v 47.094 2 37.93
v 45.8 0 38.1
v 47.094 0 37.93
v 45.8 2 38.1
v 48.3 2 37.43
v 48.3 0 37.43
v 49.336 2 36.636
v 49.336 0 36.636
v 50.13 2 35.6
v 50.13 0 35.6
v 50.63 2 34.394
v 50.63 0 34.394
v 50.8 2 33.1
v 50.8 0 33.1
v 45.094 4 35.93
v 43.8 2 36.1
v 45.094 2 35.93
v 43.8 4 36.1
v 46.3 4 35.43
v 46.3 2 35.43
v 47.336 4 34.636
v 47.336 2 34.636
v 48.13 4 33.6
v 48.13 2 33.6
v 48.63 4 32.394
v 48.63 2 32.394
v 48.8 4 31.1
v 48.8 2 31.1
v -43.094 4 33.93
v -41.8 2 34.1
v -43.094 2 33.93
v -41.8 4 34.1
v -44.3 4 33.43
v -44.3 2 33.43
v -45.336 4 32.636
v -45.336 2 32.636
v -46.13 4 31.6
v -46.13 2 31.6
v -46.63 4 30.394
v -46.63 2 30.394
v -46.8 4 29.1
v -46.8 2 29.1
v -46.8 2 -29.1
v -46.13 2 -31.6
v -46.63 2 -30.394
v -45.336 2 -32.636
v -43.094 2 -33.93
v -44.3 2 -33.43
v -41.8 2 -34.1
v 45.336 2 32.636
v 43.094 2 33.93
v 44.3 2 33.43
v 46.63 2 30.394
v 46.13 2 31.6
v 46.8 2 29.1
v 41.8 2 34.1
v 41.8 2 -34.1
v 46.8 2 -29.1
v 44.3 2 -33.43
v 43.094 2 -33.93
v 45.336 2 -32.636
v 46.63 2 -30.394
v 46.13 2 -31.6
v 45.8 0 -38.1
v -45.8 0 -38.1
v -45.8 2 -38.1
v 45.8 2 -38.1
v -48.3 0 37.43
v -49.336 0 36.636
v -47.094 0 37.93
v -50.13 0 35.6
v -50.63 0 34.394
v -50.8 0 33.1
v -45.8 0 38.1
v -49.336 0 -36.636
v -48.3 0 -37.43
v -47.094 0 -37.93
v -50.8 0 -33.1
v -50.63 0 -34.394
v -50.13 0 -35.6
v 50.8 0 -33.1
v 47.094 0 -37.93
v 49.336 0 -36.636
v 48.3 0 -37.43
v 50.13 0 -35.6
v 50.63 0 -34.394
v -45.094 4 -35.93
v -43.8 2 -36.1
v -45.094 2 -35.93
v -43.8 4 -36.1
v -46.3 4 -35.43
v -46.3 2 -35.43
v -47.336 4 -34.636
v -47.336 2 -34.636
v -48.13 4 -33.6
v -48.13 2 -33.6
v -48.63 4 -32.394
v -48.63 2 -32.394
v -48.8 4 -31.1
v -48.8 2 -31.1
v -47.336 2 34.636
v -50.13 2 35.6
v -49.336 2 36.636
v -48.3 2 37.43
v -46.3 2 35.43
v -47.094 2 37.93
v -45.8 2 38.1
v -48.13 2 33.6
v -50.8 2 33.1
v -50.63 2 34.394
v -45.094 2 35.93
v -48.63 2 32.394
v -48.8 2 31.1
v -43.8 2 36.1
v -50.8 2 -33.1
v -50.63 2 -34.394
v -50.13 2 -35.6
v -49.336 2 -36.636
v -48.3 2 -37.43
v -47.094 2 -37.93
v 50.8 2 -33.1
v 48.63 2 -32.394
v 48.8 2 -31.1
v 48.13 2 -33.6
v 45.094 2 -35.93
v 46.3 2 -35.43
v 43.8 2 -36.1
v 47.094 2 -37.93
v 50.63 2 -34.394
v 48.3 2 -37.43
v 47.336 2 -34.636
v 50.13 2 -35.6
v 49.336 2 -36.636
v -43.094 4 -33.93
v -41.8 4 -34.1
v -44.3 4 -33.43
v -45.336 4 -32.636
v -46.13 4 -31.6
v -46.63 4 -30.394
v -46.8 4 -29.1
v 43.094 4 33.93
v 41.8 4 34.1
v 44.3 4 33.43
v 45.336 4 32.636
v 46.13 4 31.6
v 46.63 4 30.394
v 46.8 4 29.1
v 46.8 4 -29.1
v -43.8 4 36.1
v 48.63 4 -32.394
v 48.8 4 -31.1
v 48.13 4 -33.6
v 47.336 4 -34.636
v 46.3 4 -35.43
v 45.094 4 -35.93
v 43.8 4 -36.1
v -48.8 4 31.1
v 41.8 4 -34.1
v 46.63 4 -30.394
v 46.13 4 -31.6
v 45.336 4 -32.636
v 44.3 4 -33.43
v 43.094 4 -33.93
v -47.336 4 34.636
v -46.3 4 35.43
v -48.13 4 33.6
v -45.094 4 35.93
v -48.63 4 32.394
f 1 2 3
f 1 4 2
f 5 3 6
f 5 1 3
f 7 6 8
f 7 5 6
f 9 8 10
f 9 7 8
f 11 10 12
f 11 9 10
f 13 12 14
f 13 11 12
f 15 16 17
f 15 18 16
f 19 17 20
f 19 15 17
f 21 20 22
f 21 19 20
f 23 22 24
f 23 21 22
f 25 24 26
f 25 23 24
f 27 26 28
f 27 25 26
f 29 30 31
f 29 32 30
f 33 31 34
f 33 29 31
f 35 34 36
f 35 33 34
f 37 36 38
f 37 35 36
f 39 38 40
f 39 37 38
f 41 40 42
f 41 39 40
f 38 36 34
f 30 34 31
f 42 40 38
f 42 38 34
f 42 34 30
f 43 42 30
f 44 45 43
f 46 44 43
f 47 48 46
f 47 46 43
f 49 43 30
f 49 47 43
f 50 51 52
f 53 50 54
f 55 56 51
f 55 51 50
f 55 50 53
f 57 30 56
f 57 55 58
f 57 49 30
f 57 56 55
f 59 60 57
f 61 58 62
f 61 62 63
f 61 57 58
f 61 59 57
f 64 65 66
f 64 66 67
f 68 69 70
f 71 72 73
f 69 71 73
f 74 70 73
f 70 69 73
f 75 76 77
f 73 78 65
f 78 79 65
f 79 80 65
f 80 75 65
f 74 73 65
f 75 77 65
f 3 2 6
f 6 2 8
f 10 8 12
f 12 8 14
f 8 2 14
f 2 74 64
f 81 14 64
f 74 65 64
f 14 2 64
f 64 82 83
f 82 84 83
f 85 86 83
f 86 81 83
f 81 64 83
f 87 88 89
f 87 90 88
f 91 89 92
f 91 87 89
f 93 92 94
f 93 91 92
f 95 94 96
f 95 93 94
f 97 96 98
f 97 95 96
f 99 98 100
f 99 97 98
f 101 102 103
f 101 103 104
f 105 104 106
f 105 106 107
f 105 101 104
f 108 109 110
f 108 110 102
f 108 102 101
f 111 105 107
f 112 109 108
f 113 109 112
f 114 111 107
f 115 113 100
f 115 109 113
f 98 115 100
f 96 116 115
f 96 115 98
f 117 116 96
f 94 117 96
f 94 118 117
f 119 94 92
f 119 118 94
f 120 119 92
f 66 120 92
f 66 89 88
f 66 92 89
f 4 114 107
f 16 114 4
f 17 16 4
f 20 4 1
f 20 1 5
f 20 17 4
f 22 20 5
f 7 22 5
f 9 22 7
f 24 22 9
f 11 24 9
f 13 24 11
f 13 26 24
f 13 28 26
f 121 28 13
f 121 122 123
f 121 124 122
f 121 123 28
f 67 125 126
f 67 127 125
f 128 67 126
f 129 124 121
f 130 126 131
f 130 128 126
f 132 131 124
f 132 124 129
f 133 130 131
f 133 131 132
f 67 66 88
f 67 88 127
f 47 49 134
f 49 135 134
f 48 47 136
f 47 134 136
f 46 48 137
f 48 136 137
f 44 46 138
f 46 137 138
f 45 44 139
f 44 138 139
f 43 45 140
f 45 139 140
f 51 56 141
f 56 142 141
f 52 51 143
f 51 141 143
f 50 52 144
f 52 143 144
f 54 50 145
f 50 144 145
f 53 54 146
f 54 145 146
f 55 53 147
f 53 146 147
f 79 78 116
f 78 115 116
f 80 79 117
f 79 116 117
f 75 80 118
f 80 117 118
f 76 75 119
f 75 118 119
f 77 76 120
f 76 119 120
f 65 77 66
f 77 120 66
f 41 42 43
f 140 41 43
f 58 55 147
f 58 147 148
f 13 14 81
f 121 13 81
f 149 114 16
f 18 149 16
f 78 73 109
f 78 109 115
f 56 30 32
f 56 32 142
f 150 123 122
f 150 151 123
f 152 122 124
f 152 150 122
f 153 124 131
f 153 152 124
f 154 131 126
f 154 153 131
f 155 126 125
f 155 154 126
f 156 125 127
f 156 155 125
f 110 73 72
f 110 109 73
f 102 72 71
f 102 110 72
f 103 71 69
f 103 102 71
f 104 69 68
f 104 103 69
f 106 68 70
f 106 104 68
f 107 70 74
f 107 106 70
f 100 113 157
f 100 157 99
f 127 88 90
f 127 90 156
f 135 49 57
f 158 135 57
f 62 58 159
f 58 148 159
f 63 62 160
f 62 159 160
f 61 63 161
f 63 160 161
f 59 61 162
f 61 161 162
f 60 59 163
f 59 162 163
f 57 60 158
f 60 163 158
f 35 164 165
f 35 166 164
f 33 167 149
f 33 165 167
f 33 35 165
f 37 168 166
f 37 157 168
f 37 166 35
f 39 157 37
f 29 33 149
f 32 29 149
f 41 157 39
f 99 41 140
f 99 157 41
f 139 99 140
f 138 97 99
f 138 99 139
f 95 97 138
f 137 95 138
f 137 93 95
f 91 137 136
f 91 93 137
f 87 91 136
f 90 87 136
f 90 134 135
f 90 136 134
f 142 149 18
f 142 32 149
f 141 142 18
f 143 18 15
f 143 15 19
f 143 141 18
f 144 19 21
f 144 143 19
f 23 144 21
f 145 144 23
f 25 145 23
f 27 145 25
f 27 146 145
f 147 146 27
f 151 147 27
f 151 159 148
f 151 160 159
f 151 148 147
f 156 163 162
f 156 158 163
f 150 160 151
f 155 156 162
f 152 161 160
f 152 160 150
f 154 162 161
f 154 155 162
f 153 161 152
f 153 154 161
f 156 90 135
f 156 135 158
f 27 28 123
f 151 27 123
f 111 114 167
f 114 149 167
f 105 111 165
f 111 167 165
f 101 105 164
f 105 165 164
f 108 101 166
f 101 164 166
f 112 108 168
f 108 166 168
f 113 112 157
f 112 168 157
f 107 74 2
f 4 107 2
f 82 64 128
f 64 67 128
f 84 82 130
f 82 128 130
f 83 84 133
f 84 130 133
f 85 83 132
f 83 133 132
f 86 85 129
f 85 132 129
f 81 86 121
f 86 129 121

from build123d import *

# Parameters (mm, degrees)
SKETCH1_W           = 101.6
SKETCH1_H           = 76.2
BOSS_EXTRUDE1_DEPTH = 2
SKETCH2_W           = 97.6
SKETCH2_H           = 72.2
SKETCH2_W_2         = 93.6
SKETCH2_H_2         = 68.2
EXTRUDE_THIN1_DEPTH = 2
FILLET1_R           = 5
FILLET2_R           = 5


with BuildPart() as part:
    # Sketch1 → Boss-Extrude1 (new body)
    with BuildSketch(Plane(origin=(0, 0, 0), x_dir=(1, 0, 0), z_dir=(0, 1, 0))):
        Rectangle(SKETCH1_W, SKETCH1_H)
    extrude(amount=BOSS_EXTRUDE1_DEPTH)

    # Sketch2 → Extrude-Thin1 (add)
    with BuildSketch(Plane(origin=(0, 2, 0), x_dir=(1, 0, 0), z_dir=(0, 1, 0))):
        Rectangle(SKETCH2_W, SKETCH2_H)
        Rectangle(SKETCH2_W_2, SKETCH2_H_2, mode=Mode.SUBTRACT)
    extrude(amount=EXTRUDE_THIN1_DEPTH)

    # Fillet1
    fillet1_edges = [part.edges().sort_by_distance(p)[0] for p in [
        (50.8, 1, 38.1),
        (-50.8, 1, 38.1),
        (-50.8, 1, -38.1),
        (50.8, 1, -38.1),
    ]]
    fillet(fillet1_edges, radius=FILLET1_R)

    # Fillet2
    fillet2_edges = [part.edges().sort_by_distance(p)[0] for p in [
        (48.8, 3, -36.1),
        (-48.8, 3, -36.1),
        (-48.8, 3, 36.1),
        (48.8, 3, 36.1),
        (-46.8, 3, -34.1),
        (-46.8, 3, 34.1),
        (46.8, 3, 34.1),
        (46.8, 3, -34.1),
    ]]
    fillet(fillet2_edges, radius=FILLET2_R)


solid = part.part
